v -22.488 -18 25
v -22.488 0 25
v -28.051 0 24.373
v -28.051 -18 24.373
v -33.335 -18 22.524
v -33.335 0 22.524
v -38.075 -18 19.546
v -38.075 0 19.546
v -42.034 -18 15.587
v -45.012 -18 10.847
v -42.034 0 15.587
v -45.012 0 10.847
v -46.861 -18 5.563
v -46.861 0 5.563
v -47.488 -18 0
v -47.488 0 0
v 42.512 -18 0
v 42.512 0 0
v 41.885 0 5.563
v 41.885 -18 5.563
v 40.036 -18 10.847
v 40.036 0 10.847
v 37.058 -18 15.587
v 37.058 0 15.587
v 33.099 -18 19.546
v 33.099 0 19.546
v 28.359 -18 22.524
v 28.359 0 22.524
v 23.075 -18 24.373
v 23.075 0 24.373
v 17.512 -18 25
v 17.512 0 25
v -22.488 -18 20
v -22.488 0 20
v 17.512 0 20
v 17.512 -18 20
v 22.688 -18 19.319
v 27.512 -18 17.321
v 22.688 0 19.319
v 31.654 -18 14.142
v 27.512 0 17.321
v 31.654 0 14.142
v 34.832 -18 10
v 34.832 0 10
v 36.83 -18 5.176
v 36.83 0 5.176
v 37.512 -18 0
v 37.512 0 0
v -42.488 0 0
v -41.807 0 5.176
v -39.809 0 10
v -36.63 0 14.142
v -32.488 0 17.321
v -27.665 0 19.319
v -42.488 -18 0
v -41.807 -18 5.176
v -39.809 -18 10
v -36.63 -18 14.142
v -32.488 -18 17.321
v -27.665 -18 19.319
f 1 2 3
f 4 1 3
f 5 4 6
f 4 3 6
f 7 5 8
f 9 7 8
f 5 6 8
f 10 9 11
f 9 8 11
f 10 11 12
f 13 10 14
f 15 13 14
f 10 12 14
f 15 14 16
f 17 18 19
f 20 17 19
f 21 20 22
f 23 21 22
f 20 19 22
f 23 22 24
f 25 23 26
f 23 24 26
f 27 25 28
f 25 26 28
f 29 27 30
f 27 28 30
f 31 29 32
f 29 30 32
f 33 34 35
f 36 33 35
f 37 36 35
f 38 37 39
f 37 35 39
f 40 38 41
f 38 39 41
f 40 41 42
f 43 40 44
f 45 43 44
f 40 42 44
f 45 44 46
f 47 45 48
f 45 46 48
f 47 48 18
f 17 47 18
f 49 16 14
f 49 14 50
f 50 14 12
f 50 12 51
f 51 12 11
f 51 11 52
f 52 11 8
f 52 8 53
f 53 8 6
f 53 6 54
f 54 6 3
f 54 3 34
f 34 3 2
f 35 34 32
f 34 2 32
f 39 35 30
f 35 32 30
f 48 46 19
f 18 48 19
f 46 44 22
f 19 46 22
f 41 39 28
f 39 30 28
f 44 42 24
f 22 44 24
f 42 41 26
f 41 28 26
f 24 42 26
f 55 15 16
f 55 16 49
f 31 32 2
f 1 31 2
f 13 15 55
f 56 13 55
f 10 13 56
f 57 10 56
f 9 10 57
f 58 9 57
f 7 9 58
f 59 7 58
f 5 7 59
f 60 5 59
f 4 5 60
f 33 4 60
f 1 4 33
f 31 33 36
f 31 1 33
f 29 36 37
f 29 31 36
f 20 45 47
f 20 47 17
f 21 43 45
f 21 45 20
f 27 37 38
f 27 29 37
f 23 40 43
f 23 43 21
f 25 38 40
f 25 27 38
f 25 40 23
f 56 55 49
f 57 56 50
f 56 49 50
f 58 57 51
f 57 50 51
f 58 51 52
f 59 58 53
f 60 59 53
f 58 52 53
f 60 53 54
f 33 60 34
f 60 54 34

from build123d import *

# Parameters (mm, degrees)
F1_DEPTH = 18


with BuildPart() as f1:
    # F0 (on Front) → F1 (new body)
    with BuildSketch(Plane.XZ):
        with BuildLine():
            ThreePointArc((-42.488194, 0), (-36.63033, 14.142136), (-22.488194, 20))
            Line((-22.488194, 20), (-2.488194, 20))
            Line((-2.488194, 20), (17.511806, 20))
            ThreePointArc((17.511806, 20), (31.653942, 14.142136), (37.511806, 0))
            Line((37.511806, 0), (42.511806, 0))
            ThreePointArc((42.511806, 0), (35.189476, 17.67767), (17.511806, 25))
            Line((17.511806, 25), (-2.488194, 25))
            Line((-2.488194, 25), (-22.488194, 25))
            ThreePointArc((-22.488194, 25), (-40.165863, 17.67767), (-47.488194, 0))
            Line((-47.488194, 0), (-42.488194, 0))
        make_face()
    extrude(amount=F1_DEPTH)


solid = f1.part
